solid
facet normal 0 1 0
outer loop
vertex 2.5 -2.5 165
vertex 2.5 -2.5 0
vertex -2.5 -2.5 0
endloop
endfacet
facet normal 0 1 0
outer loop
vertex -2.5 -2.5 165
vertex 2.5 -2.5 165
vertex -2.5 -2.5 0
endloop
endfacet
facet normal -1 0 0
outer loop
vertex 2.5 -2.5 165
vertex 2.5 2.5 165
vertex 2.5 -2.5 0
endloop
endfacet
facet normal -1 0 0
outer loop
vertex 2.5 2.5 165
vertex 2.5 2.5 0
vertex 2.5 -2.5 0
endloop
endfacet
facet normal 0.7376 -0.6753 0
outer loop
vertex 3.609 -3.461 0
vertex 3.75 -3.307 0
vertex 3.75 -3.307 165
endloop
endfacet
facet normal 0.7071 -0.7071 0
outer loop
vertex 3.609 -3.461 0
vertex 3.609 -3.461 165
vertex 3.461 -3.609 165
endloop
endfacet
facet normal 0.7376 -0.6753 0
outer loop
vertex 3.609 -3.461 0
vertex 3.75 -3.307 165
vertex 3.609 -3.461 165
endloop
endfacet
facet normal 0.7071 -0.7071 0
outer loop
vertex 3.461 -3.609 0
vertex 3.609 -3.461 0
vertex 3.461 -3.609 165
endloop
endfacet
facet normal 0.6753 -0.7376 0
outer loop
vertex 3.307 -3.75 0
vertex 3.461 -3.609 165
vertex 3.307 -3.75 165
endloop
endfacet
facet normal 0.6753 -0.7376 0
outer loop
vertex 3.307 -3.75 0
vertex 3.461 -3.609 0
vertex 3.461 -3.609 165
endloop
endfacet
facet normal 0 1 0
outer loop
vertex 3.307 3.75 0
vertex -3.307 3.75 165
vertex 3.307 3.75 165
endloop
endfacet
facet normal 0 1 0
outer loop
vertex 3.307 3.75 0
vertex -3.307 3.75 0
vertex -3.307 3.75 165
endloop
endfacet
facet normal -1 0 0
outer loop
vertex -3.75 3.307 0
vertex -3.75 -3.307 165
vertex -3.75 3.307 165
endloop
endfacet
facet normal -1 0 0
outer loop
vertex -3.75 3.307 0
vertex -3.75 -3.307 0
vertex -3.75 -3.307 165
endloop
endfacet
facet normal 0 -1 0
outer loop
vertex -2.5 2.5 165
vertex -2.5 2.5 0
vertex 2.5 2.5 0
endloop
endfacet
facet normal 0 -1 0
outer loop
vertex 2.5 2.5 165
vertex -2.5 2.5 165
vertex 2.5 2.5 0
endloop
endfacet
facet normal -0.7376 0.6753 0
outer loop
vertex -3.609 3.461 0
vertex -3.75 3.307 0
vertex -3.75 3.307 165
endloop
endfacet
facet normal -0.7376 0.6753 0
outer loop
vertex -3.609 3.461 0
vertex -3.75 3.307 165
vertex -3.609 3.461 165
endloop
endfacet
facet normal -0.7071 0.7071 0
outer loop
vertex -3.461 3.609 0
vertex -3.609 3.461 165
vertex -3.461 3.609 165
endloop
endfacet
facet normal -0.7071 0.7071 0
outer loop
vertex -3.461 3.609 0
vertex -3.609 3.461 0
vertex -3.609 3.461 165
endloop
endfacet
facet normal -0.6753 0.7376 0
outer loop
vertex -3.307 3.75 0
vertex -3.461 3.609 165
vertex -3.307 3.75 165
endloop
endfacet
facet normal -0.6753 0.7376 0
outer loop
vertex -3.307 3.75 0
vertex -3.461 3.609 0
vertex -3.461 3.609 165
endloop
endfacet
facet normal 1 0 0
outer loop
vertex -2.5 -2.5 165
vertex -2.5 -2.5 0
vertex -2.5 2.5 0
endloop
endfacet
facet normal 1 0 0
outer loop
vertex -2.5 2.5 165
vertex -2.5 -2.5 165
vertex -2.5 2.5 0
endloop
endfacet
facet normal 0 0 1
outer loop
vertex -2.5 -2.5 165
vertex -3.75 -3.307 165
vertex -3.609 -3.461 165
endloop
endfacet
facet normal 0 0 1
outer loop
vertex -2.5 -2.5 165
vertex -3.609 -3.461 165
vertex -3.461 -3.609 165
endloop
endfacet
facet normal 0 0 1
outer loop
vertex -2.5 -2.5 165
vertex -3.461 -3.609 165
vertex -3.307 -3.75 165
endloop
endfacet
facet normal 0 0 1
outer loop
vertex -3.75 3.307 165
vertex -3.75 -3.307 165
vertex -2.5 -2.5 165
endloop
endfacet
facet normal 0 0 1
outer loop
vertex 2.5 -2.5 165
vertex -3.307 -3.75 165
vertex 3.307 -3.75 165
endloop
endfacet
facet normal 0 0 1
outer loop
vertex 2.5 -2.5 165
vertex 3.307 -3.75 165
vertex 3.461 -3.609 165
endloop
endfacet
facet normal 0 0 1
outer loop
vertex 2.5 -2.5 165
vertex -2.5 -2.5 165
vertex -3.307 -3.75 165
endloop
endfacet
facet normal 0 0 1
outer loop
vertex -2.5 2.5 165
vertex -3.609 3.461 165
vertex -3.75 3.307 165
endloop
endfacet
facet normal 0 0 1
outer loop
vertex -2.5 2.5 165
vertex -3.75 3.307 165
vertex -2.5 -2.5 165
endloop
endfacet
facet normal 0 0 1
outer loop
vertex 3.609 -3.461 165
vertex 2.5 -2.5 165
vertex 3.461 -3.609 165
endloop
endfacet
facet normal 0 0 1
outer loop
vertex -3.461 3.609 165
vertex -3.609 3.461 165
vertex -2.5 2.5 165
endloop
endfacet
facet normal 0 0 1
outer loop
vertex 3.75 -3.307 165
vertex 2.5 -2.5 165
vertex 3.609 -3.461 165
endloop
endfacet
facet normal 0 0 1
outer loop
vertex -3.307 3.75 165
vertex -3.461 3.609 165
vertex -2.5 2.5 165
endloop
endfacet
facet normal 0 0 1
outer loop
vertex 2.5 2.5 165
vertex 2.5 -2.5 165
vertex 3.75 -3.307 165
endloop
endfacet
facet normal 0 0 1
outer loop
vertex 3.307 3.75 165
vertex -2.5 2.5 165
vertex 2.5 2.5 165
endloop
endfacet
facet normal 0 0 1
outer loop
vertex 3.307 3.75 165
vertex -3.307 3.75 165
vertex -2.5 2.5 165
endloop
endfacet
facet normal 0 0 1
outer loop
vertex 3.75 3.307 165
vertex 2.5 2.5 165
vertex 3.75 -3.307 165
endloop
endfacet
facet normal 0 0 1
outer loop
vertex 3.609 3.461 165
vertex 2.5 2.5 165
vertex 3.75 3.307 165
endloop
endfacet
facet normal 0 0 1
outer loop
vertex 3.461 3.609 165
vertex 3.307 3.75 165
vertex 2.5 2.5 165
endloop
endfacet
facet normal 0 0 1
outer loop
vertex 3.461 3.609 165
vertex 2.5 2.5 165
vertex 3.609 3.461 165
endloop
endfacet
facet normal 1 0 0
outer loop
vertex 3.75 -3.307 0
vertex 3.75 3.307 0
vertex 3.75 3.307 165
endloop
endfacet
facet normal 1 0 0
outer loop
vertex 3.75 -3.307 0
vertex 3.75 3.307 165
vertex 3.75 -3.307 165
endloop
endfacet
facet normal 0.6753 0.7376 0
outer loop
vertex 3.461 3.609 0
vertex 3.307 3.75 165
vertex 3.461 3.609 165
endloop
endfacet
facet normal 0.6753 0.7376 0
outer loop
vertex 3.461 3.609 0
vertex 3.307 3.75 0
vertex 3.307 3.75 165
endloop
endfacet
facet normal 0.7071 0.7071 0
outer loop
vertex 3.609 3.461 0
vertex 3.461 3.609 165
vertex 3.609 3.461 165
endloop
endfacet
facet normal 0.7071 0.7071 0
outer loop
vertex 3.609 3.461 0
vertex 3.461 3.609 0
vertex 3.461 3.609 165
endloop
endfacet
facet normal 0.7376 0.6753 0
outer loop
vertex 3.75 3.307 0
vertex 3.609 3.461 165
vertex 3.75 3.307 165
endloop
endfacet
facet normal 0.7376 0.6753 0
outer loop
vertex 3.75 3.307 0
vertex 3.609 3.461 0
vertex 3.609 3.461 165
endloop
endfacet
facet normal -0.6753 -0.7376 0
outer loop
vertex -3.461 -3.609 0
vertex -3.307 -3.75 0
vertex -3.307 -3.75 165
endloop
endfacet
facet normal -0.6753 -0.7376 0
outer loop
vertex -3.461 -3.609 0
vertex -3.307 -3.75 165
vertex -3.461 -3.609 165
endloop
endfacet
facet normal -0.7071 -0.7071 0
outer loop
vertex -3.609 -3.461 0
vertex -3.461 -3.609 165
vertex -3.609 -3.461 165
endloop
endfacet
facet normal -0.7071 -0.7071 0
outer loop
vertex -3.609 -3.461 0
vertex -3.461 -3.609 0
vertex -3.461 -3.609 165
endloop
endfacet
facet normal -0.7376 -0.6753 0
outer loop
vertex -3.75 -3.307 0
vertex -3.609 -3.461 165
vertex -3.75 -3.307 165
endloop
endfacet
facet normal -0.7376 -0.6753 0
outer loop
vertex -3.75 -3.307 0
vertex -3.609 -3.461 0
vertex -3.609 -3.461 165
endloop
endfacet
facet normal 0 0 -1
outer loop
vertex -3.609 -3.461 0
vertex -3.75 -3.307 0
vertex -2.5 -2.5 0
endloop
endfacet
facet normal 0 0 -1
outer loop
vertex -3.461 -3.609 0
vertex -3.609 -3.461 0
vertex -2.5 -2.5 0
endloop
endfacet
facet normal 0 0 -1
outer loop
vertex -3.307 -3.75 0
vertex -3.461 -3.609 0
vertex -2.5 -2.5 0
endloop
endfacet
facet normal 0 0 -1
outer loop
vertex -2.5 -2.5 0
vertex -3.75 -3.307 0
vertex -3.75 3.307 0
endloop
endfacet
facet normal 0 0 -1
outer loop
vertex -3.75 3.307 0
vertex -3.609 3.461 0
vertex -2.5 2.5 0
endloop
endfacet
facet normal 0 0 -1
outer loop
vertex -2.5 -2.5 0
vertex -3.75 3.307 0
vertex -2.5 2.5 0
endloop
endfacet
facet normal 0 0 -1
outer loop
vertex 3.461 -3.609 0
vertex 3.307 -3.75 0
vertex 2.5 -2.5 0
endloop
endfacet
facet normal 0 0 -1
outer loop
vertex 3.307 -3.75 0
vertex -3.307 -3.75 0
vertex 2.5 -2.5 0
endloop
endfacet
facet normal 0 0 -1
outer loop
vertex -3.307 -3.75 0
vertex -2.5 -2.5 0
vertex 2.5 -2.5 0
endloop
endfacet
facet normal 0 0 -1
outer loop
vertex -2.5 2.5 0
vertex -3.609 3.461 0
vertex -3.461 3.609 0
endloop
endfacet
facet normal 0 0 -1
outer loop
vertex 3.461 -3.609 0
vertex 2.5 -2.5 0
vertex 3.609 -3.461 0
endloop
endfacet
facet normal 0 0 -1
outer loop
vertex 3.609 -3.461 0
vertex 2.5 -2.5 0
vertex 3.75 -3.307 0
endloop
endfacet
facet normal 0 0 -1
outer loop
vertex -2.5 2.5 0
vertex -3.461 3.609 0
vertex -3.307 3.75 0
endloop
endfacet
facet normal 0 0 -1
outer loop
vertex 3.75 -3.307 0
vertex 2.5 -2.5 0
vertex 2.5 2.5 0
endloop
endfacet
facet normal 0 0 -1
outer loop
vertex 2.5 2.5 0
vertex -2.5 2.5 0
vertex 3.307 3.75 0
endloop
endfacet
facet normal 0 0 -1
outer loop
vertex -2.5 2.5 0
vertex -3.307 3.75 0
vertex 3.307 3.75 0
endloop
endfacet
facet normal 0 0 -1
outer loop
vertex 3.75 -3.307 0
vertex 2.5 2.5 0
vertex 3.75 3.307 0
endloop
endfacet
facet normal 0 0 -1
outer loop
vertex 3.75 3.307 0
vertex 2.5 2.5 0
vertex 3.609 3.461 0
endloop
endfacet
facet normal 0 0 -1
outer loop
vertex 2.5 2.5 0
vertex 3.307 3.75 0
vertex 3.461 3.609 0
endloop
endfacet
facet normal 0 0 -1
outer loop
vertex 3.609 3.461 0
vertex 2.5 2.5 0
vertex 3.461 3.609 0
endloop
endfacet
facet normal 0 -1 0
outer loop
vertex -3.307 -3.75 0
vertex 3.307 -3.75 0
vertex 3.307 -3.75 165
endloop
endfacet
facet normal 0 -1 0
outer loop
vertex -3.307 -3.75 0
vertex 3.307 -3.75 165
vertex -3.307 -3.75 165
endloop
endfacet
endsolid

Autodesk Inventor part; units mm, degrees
ref_plane "YZ Plane" through (0, 0, 0) normal (1, 0, 0) x (0, 1, 0)
ref_plane "XZ Plane" through (0, 0, 0) normal (0, 1, 0) x (-1, 0, 0)
ref_plane "XY Plane" through (0, 0, 0) normal (0, 0, 1) x (1, 0, 0)
sketch "Sketch1" plane through (0, 0, 0) normal (0, 0, 1) x (1, 0, 0)
  circle A0 centre (0, 0) radius 5
  line L0 (-2.5, 2.5) -> (2.5, 2.5)
  line L1 (2.5, 2.5) -> (2.5, -2.5)
  line L2 (2.5, -2.5) -> (-2.5, -2.5)
  line L3 (-2.5, -2.5) -> (-2.5, 2.5)
  line L4 (-2.5, 2.5) -> (2.5, -2.5) construction
  line L5 (2.5, 2.5) -> (-2.5, -2.5) construction
  line L6 (-3.75, 3.75) -> (3.75, 3.75)
  line L7 (3.75, 3.75) -> (3.75, -3.75)
  line L8 (3.75, -3.75) -> (-3.75, -3.75)
  line L9 (-3.75, -3.75) -> (-3.75, 3.75)
  line L10 (-3.75, 3.75) -> (3.75, -3.75) construction
  line L11 (3.75, 3.75) -> (-3.75, -3.75) construction
  point P0 (-3.75, 3.3072)
  point P1 (-3.75, -3.3072)
  point P2 (-3.3072, -3.75)
  point P3 (3.3072, -3.75)
  point P4 (3.75, -3.3072)
  point P5 (3.75, 3.3072)
  point P6 (3.3072, 3.75)
  point P7 (-3.3072, 3.75)
  dimension "d0" = 10
  dimension "d1" = 5
  dimension "d2" = 5
  dimension "d3" = 7.5
  dimension "d4" = 7.5
extrude "Extrusion1" add sketch "Sketch1" along normal blind 165 contours L7 A0 L8 L9 L6
properties part number "IgusDryLinQ-AWMQ-10" material "Aluminum 6061"
